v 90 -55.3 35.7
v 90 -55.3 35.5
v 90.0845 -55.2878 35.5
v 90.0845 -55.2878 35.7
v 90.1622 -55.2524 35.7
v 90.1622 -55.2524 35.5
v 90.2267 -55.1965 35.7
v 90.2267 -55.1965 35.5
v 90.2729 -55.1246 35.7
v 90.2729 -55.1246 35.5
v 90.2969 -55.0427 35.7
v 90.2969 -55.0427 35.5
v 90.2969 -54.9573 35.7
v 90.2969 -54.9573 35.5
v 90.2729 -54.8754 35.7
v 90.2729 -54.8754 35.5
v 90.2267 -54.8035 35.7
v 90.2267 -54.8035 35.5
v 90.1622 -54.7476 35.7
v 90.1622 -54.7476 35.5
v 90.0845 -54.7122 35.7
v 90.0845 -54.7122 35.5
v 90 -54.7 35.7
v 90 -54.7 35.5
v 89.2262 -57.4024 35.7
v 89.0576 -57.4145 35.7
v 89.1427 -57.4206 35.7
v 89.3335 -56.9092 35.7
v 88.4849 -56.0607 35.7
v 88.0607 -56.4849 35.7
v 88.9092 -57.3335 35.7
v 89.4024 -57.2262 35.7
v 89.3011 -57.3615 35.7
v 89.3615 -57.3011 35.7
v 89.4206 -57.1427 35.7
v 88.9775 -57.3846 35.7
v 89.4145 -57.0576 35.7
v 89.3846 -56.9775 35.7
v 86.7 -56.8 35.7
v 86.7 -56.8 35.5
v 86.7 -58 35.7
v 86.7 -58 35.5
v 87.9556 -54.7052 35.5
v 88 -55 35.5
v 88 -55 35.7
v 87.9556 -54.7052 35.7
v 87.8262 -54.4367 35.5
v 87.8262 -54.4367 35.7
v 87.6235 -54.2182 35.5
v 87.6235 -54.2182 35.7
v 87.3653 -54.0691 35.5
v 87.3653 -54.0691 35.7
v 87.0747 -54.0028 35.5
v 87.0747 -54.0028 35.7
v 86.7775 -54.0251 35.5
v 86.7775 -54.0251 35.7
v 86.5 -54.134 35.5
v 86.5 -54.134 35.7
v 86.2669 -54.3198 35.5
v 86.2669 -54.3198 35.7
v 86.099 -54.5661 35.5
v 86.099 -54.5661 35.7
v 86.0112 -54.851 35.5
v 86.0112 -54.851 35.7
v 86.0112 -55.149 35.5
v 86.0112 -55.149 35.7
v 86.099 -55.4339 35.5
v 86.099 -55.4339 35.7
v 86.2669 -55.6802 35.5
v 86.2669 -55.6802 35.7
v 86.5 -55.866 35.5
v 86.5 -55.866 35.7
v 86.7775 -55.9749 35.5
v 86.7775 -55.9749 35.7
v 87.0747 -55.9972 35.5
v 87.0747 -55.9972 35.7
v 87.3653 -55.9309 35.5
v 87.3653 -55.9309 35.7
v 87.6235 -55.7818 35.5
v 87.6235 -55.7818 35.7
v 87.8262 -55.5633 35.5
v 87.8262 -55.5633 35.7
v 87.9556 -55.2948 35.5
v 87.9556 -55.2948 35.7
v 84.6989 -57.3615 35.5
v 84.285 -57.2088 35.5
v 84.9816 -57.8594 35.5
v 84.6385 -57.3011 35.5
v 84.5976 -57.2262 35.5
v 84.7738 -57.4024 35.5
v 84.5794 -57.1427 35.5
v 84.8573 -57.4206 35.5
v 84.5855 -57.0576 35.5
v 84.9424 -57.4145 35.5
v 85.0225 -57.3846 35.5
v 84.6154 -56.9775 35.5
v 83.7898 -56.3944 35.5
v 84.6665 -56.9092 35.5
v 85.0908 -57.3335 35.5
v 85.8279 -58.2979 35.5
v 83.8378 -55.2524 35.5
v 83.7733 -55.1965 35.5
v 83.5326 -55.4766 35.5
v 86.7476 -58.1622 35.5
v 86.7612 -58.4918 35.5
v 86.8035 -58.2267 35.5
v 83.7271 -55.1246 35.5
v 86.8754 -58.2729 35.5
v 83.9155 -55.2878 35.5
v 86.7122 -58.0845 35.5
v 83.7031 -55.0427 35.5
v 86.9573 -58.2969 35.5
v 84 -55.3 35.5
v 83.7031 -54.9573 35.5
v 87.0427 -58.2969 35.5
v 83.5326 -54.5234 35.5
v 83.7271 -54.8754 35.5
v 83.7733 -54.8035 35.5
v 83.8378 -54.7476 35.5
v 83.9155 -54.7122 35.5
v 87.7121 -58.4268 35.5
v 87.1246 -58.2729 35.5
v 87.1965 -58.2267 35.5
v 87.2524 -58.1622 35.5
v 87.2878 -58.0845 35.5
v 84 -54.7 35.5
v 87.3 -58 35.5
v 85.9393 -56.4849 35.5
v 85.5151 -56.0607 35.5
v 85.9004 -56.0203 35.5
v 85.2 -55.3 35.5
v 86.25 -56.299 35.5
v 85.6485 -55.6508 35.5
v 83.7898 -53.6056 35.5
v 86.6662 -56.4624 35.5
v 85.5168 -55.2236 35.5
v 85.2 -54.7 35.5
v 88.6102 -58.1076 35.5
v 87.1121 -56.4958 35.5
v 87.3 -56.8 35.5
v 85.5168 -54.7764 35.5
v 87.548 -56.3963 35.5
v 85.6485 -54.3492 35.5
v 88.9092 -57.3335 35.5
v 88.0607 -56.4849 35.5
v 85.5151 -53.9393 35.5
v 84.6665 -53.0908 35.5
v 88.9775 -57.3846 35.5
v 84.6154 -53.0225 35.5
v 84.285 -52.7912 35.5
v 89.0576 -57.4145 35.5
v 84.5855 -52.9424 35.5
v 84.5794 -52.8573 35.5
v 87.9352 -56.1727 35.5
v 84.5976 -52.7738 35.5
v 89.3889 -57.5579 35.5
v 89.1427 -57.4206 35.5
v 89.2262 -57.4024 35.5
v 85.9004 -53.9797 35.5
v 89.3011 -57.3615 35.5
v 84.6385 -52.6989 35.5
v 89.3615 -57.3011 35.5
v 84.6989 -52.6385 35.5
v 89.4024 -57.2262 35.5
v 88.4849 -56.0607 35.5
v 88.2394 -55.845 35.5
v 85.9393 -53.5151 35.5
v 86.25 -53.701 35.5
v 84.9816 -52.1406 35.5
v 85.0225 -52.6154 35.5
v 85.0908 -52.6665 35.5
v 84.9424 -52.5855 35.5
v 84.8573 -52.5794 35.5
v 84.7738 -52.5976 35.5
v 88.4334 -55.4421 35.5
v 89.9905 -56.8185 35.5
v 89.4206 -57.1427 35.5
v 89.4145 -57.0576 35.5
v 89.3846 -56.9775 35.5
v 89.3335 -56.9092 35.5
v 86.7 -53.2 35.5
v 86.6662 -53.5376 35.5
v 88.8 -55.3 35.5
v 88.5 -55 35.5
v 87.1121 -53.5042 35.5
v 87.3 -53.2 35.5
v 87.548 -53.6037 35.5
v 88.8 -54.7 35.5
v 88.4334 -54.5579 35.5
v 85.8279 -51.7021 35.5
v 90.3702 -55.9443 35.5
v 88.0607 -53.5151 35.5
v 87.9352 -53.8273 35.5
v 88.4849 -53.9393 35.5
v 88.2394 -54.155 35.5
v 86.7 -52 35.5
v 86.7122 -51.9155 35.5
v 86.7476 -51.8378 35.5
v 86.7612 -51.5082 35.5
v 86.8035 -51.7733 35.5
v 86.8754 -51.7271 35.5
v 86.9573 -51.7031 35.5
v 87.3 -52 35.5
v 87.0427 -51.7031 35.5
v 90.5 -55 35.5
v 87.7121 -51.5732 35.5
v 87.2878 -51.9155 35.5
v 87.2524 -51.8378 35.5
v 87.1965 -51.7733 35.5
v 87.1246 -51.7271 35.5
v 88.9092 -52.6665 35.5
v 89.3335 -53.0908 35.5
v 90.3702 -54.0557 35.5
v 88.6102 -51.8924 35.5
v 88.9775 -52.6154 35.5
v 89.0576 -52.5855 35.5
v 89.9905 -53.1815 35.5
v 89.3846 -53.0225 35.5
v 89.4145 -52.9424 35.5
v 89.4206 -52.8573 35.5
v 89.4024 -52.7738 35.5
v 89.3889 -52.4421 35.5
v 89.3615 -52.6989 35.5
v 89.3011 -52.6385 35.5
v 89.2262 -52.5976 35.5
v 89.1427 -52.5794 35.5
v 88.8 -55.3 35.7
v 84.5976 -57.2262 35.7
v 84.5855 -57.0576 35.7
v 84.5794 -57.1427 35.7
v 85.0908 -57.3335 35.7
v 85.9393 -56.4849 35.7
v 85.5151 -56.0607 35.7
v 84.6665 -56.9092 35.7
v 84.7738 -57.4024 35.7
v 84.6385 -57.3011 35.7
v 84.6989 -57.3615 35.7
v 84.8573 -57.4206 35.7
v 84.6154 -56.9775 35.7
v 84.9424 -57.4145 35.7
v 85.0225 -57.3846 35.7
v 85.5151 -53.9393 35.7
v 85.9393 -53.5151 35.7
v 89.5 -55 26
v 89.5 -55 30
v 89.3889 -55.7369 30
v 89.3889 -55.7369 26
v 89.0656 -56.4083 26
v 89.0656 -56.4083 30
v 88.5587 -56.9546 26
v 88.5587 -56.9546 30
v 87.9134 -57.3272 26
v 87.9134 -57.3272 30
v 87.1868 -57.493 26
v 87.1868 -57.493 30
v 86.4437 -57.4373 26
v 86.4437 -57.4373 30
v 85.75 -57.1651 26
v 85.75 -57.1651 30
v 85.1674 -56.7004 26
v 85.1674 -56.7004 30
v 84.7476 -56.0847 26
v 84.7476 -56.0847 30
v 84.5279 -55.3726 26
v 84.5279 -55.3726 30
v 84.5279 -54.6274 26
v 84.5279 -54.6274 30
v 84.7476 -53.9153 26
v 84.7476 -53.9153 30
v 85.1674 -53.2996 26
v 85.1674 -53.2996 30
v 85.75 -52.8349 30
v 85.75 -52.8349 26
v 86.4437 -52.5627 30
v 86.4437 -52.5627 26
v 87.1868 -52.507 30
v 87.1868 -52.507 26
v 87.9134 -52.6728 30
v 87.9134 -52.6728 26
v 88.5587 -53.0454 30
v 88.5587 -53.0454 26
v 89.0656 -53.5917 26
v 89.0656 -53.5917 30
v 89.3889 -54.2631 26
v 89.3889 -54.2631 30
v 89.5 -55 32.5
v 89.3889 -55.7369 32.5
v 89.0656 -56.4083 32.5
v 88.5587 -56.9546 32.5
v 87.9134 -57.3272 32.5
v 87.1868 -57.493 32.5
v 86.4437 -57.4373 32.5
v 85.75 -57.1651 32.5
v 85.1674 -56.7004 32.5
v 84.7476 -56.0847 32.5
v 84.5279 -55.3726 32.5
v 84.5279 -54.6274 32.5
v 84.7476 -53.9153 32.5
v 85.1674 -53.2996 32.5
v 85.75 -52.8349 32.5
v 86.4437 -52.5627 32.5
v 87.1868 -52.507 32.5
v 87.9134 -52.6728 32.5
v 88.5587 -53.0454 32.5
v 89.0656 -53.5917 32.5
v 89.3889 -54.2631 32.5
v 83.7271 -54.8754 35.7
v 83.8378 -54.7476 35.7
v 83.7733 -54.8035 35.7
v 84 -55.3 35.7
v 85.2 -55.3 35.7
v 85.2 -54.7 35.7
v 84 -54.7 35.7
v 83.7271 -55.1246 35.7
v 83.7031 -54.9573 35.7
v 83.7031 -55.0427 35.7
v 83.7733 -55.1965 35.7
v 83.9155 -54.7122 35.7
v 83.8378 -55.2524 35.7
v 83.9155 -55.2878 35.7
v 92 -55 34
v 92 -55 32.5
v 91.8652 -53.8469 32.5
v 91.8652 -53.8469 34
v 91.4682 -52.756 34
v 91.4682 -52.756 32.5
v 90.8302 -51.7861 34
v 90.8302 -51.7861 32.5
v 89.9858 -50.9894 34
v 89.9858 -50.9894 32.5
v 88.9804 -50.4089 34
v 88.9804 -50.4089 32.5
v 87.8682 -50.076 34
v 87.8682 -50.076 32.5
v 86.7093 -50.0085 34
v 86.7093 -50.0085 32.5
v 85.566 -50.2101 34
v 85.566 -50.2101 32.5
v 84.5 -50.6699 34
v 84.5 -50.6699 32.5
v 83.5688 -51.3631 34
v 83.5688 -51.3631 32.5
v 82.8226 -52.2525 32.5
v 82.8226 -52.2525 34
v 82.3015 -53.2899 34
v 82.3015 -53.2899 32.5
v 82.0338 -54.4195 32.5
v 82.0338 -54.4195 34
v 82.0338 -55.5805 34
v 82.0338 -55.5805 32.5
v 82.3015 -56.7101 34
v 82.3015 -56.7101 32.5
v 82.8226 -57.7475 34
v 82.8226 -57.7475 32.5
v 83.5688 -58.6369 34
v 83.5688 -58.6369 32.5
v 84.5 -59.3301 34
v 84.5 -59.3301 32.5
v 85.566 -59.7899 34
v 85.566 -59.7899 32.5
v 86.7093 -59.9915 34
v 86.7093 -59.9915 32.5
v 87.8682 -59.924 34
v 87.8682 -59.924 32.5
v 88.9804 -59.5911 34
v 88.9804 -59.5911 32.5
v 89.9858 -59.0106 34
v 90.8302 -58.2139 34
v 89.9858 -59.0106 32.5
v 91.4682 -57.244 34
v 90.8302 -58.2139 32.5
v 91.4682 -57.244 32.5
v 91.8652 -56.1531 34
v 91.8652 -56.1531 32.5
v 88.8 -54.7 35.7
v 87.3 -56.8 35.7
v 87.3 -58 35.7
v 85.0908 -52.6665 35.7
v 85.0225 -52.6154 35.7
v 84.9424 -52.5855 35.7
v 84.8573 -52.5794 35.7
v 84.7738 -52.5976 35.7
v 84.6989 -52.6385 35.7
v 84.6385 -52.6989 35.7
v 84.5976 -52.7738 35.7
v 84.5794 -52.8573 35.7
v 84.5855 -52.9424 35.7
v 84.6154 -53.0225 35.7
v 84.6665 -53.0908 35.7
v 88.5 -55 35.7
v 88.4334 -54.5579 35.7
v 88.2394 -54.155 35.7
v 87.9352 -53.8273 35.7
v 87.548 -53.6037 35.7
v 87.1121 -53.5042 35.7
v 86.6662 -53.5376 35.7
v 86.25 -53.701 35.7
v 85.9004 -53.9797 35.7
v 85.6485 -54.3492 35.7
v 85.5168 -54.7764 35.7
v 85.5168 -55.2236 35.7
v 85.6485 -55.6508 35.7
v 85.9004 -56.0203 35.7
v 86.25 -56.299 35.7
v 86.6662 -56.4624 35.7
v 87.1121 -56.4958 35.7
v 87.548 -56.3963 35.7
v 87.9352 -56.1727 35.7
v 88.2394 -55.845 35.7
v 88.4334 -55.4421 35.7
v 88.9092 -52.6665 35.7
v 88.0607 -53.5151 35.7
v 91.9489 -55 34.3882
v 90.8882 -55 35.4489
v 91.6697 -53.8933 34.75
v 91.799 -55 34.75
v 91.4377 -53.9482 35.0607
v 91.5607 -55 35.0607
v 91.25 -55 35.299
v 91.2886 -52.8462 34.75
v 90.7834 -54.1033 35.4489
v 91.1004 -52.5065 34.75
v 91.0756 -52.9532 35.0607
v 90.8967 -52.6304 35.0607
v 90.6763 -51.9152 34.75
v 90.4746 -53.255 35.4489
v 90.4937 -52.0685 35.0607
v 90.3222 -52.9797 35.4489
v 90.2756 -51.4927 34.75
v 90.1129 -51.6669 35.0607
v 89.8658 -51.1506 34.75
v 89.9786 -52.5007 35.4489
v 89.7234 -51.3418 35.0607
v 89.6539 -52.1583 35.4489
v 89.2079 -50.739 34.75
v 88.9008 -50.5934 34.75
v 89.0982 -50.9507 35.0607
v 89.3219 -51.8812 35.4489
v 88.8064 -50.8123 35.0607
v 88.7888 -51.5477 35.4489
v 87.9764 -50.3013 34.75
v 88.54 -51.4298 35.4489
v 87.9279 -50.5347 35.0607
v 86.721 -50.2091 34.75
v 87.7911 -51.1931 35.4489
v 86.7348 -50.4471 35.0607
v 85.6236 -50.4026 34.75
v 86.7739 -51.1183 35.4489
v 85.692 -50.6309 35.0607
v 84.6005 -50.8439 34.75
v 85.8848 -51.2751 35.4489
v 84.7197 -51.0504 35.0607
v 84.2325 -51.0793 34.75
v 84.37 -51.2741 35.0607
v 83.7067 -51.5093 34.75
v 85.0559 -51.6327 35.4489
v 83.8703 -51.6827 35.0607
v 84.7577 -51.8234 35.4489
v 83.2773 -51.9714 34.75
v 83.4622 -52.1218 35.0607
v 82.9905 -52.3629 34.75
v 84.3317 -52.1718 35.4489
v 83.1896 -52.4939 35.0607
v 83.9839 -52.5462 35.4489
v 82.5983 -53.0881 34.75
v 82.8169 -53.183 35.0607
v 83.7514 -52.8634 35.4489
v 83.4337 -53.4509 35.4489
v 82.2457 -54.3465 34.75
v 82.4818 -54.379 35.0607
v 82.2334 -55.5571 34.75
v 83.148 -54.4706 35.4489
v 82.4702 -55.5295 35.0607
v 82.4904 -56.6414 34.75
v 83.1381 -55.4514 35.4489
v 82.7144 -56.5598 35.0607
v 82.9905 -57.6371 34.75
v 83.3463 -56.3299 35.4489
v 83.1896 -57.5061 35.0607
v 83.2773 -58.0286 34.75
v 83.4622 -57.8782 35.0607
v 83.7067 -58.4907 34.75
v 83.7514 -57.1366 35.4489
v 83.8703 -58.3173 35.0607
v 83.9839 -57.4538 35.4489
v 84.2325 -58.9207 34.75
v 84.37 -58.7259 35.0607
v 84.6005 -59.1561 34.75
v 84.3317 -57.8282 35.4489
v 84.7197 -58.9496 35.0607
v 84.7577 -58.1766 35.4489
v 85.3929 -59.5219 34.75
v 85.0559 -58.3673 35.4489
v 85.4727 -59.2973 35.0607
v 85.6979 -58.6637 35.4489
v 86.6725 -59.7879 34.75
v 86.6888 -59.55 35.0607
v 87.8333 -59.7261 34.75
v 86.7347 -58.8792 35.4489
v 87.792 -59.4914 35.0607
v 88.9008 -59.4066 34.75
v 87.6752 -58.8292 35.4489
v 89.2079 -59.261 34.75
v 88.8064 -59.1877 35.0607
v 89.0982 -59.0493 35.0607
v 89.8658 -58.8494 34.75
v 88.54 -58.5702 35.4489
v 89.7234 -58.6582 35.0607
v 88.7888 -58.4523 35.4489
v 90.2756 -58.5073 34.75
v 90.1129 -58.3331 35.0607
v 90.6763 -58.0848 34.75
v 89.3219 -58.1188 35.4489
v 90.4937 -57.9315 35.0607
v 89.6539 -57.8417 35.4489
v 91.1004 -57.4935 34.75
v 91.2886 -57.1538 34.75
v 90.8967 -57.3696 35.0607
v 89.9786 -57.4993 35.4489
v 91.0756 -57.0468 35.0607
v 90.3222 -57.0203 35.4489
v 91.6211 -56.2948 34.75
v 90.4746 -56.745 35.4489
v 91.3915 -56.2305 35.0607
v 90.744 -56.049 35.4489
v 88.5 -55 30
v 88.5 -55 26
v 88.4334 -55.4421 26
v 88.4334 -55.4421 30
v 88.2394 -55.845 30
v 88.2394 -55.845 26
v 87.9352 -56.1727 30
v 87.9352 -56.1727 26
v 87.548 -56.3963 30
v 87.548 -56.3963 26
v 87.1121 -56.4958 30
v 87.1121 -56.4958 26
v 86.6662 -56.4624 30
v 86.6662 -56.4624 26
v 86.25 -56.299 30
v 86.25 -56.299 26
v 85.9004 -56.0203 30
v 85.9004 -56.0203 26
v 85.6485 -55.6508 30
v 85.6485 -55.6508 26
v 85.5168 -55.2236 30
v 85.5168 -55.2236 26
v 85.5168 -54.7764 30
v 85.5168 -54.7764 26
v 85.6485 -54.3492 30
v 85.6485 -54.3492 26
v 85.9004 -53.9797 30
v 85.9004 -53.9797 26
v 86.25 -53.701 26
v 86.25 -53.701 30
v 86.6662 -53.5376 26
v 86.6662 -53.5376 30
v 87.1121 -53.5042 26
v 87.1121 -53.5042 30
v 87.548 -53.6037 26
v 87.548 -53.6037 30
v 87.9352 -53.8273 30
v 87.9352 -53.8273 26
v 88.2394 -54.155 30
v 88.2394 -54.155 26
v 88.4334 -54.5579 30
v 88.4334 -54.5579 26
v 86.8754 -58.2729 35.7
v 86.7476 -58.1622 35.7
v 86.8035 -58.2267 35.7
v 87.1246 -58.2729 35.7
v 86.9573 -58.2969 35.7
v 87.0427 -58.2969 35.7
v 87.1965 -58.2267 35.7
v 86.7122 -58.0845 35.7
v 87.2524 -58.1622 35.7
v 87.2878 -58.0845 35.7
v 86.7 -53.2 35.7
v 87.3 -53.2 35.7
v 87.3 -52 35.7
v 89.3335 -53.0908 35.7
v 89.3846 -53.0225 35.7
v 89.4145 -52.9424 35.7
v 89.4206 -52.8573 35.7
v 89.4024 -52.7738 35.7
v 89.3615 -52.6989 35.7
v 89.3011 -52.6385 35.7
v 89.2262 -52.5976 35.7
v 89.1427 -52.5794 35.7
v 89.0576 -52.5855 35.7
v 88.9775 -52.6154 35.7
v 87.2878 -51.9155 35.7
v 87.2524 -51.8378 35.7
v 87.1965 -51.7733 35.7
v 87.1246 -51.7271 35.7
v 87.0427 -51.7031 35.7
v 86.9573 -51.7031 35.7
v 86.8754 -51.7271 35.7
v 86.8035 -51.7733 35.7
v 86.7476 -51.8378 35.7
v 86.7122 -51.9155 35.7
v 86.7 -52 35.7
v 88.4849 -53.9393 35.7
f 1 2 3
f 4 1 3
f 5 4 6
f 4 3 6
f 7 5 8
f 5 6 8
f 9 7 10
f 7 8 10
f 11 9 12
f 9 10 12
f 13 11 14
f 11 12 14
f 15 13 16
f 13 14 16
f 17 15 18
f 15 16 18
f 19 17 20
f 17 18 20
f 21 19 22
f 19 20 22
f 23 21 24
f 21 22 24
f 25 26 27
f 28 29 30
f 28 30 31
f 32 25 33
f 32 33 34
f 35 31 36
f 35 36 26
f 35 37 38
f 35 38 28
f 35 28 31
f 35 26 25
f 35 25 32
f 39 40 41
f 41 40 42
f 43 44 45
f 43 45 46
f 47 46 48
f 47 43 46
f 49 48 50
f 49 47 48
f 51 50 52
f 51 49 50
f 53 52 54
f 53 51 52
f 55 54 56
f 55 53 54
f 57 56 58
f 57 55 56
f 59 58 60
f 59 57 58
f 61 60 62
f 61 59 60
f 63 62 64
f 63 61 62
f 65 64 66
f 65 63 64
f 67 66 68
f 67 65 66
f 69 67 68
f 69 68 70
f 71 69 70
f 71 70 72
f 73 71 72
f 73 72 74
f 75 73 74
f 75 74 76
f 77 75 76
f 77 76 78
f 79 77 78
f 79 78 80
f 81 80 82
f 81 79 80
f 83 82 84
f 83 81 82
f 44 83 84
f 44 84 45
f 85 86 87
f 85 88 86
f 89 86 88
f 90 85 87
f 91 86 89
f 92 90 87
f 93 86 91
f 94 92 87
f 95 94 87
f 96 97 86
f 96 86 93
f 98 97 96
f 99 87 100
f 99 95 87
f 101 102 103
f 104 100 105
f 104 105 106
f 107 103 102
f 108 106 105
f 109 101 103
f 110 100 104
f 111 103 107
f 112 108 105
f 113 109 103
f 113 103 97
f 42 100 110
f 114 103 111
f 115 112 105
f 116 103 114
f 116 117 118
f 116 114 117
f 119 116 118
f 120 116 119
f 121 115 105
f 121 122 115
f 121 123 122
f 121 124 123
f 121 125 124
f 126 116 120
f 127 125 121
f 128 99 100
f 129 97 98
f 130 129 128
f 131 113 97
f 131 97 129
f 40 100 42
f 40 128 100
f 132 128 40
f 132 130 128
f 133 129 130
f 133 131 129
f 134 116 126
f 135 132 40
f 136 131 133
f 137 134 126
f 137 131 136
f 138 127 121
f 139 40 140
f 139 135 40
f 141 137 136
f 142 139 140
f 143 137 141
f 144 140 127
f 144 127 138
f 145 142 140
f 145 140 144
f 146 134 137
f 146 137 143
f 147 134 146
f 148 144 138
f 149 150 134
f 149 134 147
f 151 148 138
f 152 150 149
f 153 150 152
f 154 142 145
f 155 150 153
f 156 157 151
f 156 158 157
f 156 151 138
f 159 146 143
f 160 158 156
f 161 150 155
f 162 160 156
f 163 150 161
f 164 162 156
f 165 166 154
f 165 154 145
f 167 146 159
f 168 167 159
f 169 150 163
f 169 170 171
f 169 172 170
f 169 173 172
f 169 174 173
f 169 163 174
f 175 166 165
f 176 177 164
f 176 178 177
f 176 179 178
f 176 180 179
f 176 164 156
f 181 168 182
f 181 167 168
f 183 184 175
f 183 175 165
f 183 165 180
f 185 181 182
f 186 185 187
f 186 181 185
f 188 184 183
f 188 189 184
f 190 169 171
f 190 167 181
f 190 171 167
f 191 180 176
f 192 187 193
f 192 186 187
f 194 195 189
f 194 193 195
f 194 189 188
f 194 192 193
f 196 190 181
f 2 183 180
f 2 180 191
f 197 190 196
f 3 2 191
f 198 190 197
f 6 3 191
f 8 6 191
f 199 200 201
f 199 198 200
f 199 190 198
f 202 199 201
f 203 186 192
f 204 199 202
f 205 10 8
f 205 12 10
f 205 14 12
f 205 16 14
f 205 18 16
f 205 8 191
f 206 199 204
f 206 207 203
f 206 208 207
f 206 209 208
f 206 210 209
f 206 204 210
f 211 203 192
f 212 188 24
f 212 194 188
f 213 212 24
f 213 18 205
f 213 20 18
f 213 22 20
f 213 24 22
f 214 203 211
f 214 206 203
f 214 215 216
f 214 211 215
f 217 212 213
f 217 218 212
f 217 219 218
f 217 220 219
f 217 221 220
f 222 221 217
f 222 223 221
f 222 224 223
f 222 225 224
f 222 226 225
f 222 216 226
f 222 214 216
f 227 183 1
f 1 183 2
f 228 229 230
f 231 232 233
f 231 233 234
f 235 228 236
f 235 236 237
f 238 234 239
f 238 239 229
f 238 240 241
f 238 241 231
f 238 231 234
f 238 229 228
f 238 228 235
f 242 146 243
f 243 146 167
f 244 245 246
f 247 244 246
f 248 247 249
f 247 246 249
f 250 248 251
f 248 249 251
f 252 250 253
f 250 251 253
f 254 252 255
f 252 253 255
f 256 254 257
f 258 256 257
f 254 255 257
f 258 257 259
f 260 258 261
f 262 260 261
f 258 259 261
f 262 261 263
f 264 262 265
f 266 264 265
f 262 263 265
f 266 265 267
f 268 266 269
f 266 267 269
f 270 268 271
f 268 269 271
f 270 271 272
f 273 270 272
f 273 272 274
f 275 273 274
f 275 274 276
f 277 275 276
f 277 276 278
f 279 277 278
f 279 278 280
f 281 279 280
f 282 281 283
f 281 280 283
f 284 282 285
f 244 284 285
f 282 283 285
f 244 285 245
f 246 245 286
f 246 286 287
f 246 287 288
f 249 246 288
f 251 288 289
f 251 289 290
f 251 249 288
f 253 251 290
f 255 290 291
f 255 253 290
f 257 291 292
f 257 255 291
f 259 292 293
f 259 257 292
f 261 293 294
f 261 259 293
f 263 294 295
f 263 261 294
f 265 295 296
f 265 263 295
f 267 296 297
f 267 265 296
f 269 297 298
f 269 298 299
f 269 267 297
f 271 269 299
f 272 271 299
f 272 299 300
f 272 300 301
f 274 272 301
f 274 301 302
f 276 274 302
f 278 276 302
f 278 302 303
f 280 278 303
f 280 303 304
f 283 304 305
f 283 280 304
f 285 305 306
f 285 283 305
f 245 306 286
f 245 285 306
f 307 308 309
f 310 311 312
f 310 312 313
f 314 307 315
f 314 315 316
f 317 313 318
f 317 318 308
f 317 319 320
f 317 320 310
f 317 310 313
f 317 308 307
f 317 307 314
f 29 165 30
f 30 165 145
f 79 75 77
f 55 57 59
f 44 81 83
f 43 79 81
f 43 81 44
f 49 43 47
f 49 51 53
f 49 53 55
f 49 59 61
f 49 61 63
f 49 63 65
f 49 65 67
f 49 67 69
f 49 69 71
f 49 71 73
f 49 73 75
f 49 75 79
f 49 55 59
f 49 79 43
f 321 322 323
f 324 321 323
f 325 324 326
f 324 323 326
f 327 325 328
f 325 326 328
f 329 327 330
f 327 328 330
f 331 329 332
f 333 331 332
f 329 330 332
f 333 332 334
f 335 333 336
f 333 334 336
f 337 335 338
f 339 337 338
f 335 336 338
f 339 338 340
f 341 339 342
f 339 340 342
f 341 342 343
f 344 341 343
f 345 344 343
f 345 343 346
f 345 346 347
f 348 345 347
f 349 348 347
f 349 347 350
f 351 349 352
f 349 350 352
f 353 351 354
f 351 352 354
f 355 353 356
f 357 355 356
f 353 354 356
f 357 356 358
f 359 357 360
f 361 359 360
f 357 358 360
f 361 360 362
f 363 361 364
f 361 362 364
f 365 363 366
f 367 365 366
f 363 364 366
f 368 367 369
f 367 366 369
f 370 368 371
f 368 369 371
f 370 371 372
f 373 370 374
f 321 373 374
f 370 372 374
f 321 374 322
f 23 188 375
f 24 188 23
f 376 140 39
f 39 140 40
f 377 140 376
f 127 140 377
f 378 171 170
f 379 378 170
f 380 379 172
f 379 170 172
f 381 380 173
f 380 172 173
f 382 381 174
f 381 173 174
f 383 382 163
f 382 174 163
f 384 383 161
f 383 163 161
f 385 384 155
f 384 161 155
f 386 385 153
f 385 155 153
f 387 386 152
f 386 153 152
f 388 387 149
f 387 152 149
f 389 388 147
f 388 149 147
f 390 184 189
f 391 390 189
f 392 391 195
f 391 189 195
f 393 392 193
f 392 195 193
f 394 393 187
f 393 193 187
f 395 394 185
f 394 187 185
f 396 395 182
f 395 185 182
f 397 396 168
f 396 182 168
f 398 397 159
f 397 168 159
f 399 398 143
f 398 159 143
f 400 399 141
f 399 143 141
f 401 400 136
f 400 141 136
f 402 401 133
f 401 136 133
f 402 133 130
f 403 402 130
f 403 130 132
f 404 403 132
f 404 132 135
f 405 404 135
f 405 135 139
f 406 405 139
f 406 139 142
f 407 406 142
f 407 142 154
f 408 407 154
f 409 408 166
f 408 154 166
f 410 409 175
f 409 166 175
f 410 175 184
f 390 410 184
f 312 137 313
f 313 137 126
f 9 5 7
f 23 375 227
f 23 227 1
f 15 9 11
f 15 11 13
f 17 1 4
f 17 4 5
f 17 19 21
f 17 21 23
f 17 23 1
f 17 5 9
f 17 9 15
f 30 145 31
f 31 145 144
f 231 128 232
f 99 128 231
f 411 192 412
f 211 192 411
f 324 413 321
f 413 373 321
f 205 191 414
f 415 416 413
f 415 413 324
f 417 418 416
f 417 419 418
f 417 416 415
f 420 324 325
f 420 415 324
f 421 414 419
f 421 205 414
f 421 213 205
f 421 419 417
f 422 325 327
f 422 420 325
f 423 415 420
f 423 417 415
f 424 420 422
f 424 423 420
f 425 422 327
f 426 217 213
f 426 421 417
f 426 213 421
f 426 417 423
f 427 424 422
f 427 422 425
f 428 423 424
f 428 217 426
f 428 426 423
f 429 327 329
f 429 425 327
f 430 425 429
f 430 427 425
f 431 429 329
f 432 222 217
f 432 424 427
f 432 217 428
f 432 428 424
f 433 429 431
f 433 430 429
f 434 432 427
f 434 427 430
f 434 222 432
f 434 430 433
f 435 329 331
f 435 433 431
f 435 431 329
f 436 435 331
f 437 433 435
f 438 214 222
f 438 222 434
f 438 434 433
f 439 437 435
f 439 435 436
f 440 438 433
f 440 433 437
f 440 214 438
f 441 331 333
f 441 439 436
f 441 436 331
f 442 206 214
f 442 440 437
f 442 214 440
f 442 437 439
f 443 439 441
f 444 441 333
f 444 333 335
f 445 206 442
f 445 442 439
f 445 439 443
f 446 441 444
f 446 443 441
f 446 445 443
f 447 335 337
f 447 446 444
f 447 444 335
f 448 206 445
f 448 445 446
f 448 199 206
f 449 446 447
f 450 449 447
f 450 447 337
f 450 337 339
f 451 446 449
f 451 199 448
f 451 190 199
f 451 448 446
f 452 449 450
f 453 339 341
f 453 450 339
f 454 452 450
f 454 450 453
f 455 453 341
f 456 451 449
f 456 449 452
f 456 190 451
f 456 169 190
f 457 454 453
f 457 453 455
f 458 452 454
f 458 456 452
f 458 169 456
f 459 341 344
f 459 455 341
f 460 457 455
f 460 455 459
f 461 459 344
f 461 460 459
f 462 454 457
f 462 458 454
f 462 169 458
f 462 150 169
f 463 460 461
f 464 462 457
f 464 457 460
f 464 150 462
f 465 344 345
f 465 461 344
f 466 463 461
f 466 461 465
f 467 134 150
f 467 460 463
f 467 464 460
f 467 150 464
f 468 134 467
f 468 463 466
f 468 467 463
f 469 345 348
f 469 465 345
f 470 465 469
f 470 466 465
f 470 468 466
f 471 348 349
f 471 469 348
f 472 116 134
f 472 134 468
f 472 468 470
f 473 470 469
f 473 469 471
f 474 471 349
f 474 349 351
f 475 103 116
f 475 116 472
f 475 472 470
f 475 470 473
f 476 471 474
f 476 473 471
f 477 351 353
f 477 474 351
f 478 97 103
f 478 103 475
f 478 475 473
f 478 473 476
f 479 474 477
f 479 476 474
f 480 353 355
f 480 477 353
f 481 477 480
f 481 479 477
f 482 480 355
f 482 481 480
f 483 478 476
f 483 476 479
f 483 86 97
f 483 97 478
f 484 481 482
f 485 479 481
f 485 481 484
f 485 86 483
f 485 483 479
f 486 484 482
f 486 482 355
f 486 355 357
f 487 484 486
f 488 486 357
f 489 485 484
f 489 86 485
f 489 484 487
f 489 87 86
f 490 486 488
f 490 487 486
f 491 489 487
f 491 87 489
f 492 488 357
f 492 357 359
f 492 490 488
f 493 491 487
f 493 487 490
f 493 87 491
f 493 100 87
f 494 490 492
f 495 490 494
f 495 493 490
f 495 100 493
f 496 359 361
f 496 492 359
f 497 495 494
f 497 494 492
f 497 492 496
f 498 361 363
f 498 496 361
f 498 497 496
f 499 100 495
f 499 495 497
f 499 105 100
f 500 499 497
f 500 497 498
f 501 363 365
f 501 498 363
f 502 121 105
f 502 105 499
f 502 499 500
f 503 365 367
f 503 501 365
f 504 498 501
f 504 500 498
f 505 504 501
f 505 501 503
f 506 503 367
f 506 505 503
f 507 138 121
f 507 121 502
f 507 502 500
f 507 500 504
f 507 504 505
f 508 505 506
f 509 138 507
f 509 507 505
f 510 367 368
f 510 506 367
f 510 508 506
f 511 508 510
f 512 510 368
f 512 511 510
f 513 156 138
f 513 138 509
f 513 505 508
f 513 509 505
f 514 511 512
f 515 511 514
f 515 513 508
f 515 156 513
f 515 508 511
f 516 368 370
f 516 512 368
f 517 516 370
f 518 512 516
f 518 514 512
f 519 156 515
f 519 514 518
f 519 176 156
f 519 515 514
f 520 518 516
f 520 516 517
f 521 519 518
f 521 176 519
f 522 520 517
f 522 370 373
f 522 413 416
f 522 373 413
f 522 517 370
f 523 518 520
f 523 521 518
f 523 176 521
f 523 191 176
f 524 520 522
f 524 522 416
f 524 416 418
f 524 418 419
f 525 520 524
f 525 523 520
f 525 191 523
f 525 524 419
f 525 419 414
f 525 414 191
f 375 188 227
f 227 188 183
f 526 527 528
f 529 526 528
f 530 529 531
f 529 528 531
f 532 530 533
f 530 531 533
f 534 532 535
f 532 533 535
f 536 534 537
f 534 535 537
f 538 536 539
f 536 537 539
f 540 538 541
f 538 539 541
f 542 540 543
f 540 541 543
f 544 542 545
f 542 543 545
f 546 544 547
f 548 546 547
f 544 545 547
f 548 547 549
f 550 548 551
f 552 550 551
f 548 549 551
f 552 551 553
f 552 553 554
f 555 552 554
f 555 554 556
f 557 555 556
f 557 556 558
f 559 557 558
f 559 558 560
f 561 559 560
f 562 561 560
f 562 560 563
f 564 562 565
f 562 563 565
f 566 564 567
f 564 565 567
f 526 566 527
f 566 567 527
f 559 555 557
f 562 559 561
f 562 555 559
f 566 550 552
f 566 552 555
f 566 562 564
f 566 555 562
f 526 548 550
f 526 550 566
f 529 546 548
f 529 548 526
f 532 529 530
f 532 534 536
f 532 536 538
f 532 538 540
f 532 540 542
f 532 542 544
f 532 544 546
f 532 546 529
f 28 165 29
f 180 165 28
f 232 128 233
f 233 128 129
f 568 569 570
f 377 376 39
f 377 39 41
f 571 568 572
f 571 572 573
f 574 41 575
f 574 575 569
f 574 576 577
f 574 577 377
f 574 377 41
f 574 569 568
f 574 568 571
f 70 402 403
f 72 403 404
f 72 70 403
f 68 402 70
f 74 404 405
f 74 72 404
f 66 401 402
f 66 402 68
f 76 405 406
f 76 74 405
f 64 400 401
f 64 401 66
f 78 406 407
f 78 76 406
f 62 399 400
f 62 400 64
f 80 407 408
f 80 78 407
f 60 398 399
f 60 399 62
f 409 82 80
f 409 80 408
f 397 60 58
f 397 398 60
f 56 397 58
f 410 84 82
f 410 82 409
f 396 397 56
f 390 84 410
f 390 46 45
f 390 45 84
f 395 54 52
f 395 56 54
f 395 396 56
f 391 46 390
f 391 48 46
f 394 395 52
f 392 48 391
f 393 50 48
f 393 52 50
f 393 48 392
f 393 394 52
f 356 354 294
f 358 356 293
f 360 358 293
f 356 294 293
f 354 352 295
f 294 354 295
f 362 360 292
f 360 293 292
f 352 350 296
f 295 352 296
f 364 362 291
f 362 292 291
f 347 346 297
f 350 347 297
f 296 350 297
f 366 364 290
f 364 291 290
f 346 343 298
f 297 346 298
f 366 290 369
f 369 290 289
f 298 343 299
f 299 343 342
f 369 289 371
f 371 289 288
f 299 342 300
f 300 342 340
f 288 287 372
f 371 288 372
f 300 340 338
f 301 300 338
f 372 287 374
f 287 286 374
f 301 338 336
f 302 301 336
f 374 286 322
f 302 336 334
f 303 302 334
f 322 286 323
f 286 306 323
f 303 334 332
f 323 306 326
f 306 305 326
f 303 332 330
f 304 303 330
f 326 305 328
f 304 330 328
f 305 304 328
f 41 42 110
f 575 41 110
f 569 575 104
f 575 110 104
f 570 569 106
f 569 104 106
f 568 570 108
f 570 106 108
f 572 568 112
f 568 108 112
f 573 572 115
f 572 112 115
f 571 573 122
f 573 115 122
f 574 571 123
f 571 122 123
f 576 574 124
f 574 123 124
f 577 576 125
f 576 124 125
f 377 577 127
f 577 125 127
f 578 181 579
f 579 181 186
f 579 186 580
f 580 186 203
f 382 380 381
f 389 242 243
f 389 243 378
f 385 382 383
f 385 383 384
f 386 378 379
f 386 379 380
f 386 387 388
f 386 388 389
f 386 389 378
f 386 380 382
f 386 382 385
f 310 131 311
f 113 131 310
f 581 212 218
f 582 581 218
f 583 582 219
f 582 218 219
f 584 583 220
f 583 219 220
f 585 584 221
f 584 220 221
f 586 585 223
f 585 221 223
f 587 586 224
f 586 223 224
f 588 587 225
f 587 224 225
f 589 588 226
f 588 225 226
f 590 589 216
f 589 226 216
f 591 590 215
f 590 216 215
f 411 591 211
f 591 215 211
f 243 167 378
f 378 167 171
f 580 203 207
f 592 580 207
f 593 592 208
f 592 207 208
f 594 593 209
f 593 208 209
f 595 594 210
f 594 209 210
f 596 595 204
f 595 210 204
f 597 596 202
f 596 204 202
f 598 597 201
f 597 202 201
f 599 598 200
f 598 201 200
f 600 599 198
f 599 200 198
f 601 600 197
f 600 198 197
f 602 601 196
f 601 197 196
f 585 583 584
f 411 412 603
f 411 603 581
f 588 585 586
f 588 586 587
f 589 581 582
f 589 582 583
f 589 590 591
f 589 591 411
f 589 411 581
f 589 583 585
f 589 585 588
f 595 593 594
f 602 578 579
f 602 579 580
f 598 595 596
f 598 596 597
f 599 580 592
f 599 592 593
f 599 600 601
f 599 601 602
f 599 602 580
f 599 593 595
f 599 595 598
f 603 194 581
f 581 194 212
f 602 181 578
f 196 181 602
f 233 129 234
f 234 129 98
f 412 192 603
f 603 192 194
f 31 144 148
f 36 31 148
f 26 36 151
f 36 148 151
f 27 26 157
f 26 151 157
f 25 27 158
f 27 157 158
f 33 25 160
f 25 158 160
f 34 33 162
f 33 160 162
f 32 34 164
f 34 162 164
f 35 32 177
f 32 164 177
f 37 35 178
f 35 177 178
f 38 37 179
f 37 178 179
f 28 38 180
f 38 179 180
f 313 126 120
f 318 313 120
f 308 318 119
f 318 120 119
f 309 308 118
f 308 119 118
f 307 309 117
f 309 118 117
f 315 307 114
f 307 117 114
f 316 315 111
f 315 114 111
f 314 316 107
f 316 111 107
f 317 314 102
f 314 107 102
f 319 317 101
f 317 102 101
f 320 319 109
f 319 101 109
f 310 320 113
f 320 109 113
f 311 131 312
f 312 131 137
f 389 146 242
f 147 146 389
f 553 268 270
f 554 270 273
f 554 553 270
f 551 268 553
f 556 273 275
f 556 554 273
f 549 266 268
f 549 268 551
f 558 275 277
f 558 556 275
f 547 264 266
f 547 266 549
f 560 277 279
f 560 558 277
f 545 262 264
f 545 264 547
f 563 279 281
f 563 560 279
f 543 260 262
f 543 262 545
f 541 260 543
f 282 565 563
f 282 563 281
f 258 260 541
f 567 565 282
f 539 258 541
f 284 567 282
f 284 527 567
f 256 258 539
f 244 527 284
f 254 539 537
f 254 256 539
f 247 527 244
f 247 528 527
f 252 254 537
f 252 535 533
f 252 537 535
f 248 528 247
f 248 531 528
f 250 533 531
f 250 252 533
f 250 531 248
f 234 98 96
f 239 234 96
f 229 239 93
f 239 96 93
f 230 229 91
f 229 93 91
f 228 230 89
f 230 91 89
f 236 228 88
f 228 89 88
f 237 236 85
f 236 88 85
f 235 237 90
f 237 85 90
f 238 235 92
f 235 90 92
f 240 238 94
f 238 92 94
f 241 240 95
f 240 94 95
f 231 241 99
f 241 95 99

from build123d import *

# Parameters (mm, degrees)
SKETCH046_R        = 2.5
PAD023_DEPTH       = 2.5
SKETCH047_R        = 5
PAD024_DEPTH       = 3
FILLET003_R        = 1.5
SKETCH049_R        = 2.5
PAD025_DEPTH       = 4
SKETCH050_R        = 1.5
POCKET026_DEPTH    = 4
PAD053_DEPTH       = 0.2
SKETCH087_R        = 1.5
SKETCH087_R_2      = 1
PAD054_DEPTH       = 0.2
POLARPATTERN_COUNT = 8


with BuildPart() as part:
    # Sketch046 → Pad023 (new body)
    with BuildSketch(Plane(origin=(0, 0, 30), x_dir=(1, 0, 0), z_dir=(0, 0, -1))):
        with Locations((101, 55)):
            Circle(SKETCH046_R)
    extrude(amount=-PAD023_DEPTH)

    # Sketch047 (on Face3 of Pad023) → Pad024 (join)
    with BuildSketch(Plane.XY.offset(32.5)):
        with Locations((101, -55)):
            Circle(SKETCH047_R)
    extrude(amount=PAD024_DEPTH)

    # Fillet003
    fillet003_edges = [part.edges().sort_by_distance(p)[0] for p in [
        (96, -55, 35.5),
    ]]
    fillet(fillet003_edges, radius=FILLET003_R)

    # Sketch049 → Pad025 (join)
    with BuildSketch(Plane(origin=(0, 0, 30), x_dir=(1, 0, 0), z_dir=(0, 0, -1))):
        with Locations((101, 55)):
            Circle(SKETCH049_R)
    extrude(amount=PAD025_DEPTH)

    # Sketch050 (on Face17 of Pad025) → Pocket026 (cut)
    with BuildSketch(Plane(origin=(0, 0, 26), x_dir=(1, 0, 0), z_dir=(0, 0, -1))):
        with Locations((101, 55)):
            Circle(SKETCH050_R)
    extrude(amount=-POCKET026_DEPTH, mode=Mode.SUBTRACT)


with BuildPart() as part_1:
    # Body002 placement: moved
    add(part.part.moved(Location((75, 0, 0))))

    # Sketch086 (on Face4 of Clone001) → Pad053 (new body)
    with BuildSketch(Plane(origin=(176, -55, 35.5), x_dir=(1, 0, 0), z_dir=(0, 0, 1))):
        with BuildLine():
            Line((1.8, 0.3), (1.8, -0.3))
            Line((1.8, -0.3), (3, -0.3))
            ThreePointArc((3, -0.3), (3.3, 0), (3, 0.3))
            Line((1.8, 0.3), (3, 0.3))
        make_face()
    pad053 = extrude(amount=PAD053_DEPTH)

    # Sketch087 (on Face4 of Clone001) → Pad054 (join)
    with BuildSketch(Plane(origin=(176, -55, 35.5), x_dir=(1, 0, 0), z_dir=(0, 0, 1))):
        Circle(SKETCH087_R)
        Circle(SKETCH087_R_2, mode=Mode.SUBTRACT)
    extrude(amount=PAD054_DEPTH)

    # PolarPattern: Pad053 ×8 about axis
    polarpattern_axis = Axis((176, -55, 35.5), (0, 0, 1))
    for i in range(1, POLARPATTERN_COUNT):
        add(pad053.rotate(polarpattern_axis, i * 360 / POLARPATTERN_COUNT))


with BuildPart() as part_2:
    # Body011 placement: moved
    add(part_1.part.moved(Location((-89, 0, 0))))


solid = part_2.part
